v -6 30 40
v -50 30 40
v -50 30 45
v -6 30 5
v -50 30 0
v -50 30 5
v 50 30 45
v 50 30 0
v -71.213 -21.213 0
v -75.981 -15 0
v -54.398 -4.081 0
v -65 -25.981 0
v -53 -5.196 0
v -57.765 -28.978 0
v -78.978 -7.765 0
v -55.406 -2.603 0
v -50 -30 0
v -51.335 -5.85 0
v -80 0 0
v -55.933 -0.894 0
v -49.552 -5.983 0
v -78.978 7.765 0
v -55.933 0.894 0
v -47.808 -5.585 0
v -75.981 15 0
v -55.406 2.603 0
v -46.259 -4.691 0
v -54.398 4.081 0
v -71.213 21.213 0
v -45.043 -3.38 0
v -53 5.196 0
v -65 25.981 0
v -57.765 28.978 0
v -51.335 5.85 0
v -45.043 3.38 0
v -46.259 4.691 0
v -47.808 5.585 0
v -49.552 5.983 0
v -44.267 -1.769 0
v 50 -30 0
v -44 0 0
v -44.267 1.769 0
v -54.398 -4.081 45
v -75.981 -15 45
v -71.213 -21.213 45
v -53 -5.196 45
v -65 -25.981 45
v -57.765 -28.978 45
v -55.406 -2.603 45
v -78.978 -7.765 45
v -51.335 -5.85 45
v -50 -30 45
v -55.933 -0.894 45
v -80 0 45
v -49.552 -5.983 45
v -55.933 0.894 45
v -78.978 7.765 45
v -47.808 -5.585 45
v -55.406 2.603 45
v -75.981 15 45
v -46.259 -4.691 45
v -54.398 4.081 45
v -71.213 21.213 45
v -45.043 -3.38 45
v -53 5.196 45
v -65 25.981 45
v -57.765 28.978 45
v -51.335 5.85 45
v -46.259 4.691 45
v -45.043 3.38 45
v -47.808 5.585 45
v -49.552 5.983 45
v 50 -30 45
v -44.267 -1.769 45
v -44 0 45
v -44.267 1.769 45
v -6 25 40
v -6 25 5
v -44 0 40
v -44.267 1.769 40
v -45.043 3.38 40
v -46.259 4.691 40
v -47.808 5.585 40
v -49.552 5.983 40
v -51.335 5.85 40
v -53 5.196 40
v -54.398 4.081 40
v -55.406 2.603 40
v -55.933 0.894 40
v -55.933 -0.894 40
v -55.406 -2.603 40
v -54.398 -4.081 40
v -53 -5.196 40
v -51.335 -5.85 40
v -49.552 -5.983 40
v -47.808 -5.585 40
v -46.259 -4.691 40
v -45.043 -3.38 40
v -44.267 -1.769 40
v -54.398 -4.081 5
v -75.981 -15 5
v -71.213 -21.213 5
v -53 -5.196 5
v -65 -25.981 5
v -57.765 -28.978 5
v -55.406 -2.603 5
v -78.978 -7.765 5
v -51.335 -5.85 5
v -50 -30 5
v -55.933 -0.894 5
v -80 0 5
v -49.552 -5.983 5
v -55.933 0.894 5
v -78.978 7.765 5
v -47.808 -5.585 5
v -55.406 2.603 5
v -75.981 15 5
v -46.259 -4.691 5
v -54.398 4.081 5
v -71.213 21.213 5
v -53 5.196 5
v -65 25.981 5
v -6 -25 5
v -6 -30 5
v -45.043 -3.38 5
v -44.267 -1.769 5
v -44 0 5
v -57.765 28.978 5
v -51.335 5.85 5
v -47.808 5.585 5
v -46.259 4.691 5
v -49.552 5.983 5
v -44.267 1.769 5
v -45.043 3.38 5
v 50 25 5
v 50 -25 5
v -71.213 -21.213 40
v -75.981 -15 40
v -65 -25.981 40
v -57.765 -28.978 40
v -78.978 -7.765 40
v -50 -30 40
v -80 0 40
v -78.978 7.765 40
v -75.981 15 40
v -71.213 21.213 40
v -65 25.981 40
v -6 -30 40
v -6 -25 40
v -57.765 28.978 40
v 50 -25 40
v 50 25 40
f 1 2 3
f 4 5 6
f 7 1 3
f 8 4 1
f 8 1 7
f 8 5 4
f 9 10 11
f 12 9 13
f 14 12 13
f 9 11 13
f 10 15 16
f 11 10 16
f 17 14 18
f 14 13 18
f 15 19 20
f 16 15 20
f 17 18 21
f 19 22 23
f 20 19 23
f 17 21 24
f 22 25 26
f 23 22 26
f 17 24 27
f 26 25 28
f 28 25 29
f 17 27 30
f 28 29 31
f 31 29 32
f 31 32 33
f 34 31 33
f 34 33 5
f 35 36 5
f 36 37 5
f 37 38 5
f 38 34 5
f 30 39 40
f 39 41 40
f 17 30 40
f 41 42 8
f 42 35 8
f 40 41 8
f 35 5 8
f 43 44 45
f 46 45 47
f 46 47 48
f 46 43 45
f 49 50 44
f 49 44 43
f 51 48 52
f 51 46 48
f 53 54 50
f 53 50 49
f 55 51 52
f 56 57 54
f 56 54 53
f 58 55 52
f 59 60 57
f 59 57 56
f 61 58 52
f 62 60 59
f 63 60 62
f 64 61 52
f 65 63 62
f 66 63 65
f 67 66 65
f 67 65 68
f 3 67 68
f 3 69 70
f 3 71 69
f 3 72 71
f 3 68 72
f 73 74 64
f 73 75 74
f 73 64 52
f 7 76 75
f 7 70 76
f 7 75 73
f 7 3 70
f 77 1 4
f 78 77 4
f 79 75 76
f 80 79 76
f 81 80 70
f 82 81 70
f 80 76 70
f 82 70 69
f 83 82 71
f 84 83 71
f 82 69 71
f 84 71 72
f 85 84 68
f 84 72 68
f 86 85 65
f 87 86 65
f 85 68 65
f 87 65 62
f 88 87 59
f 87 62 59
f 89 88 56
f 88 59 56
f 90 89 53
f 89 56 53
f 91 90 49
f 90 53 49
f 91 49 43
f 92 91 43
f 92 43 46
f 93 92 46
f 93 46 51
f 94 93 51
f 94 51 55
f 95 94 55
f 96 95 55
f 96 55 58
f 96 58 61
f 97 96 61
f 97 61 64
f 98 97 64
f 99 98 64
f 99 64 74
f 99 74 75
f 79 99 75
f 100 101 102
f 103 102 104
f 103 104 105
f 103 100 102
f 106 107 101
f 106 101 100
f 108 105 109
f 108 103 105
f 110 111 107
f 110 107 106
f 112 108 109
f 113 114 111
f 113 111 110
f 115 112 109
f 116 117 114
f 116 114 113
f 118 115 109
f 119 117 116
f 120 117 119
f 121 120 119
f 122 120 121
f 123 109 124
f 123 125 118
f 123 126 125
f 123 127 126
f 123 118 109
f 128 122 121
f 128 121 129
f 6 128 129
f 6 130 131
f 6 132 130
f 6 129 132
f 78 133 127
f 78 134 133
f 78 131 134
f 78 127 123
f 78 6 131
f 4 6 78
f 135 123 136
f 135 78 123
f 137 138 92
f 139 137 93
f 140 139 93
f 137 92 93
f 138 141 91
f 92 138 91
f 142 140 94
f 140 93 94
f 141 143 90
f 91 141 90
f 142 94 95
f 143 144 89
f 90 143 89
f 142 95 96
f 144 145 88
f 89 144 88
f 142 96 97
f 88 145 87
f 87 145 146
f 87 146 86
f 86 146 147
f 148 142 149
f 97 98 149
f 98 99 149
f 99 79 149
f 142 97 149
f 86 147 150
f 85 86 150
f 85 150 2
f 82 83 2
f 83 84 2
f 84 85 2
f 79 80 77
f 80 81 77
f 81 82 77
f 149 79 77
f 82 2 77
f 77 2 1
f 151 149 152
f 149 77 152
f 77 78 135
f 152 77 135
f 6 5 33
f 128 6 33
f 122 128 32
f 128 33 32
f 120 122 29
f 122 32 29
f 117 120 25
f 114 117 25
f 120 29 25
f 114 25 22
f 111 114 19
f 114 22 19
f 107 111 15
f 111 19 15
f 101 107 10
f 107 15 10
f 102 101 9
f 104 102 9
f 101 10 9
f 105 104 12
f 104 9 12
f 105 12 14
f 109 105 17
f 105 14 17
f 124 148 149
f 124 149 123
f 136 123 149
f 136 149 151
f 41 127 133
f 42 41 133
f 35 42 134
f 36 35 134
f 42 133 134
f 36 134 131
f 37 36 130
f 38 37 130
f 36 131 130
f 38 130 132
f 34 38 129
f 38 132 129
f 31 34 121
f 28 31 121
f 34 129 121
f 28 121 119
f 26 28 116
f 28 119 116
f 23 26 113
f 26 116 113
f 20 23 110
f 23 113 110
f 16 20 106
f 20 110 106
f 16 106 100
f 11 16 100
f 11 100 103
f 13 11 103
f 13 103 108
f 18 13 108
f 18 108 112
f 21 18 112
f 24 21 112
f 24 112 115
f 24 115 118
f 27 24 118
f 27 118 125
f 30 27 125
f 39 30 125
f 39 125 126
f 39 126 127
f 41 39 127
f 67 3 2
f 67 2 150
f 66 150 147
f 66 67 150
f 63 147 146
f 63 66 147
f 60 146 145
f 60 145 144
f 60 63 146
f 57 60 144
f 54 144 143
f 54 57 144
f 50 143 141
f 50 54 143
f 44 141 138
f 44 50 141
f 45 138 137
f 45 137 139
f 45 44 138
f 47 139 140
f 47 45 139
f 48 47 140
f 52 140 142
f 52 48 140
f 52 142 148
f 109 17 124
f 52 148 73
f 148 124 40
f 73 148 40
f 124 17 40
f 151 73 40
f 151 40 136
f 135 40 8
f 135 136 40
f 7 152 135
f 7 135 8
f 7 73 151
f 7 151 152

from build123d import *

# Parameters (mm, degrees)
DODANIE_WYCI_GNI_CIE1_DEPTH = 5
SZKIC2_W                    = 56
SZKIC2_H                    = 35
DODANIE_WYCI_GNI_CIE2_DEPTH = 5
SZKIC3_R                    = 6
WYTNIJ_WYCI_GNI_CIE1_DEPTH  = 97.566039579


with BuildPart() as part:
    # Szkic1 → Dodanie-wyciągnięcie1 (new body)
    with BuildSketch(Plane.XY):
        with BuildLine():
            Line((-50, -30), (50, -30))
            Line((50, -30), (50, 30))
            Line((50, 30), (-50, 30))
            ThreePointArc((-50, 30), (-80, 0), (-50, -30))
        make_face()
    extrude(amount=DODANIE_WYCI_GNI_CIE1_DEPTH)


with BuildPart() as body_2:
    # Lustro2: mirrored copy
    add(part.part.mirror(Plane.XY.offset(22.5)))


with BuildPart() as part_1:
    add(part.part)

    add(body_2.part)  # Dodanie-wyciągnięcie2 merges body 2
    # Szkic2 → Dodanie-wyciągnięcie2 (add)
    with BuildSketch(Plane(origin=(0, 30, 0), x_dir=(1, 0, 0), z_dir=(0, 1, 0))):
        with Locations((22, -22.5)):
            Rectangle(SZKIC2_W, SZKIC2_H)
    dodanie_wyci_gni_cie2 = extrude(amount=-DODANIE_WYCI_GNI_CIE2_DEPTH)

    # Lustro3: Dodanie-wyciągnięcie2 across plane
    add(dodanie_wyci_gni_cie2.mirror(Plane.ZX))

    # Szkic3 → Wytnij-wyciągnięcie1 (cut, through all)
    with BuildSketch(Plane.XY.offset(45)):
        with Locations((-50, 0)):
            Circle(SZKIC3_R)
    extrude(amount=-WYTNIJ_WYCI_GNI_CIE1_DEPTH, mode=Mode.SUBTRACT)


solid = part_1.part
